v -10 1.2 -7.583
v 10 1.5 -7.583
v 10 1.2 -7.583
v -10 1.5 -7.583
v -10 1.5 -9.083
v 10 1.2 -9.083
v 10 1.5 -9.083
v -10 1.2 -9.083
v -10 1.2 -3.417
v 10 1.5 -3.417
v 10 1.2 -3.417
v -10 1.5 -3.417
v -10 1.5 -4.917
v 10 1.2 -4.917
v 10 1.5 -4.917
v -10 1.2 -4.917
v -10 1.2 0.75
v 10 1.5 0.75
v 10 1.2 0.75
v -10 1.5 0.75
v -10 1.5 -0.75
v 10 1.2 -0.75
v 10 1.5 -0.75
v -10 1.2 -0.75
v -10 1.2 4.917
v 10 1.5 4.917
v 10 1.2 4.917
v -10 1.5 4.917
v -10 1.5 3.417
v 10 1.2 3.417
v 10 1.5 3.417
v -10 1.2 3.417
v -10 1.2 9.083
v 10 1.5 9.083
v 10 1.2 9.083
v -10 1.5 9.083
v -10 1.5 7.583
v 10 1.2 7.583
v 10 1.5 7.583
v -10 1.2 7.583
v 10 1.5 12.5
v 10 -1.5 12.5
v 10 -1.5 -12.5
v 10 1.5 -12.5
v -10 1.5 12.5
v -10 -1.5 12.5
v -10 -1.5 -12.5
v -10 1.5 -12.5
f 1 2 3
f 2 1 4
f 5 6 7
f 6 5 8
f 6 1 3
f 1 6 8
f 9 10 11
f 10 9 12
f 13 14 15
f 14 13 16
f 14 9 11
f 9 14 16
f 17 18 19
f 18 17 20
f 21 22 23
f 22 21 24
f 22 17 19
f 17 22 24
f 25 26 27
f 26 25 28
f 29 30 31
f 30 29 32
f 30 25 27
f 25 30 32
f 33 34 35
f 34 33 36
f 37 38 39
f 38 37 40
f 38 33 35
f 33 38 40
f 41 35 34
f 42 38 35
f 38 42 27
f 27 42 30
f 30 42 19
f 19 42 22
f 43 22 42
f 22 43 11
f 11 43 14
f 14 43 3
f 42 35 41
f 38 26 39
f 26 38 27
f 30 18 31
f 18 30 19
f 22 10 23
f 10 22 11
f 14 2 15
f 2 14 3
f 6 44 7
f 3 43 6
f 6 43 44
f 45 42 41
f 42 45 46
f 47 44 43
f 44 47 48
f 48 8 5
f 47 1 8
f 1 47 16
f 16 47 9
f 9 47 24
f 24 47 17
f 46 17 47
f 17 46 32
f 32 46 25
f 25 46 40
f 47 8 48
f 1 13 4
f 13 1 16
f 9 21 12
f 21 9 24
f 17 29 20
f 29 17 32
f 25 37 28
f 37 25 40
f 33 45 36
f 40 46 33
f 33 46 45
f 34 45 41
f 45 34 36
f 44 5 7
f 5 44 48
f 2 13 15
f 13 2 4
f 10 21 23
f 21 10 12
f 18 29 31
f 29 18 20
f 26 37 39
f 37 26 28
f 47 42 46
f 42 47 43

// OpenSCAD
// Gripper fingertip attachments — TPU 95A with grip ridges
// Port of hardware/cad/gripper_tips.py
// Regenerate: openscad -o hardware/stl/gripper_tips_tpu.stl hardware/scad/gripper_tips.scad

// Parameters (mm)
FINGER_WIDTH  = 20.0;
TIP_THICKNESS = 3.0;
TIP_LENGTH    = 25.0;
RIDGE_COUNT   = 5;
RIDGE_DEPTH   = 0.8;
RIDGE_WIDTH   = 1.5;

// Tip base with grip ridges cut out
difference() {
    cube([FINGER_WIDTH, TIP_THICKNESS, TIP_LENGTH], center = true);

    // Cut ridges along the grip surface
    for (i = [0 : RIDGE_COUNT - 1]) {
        z_pos = -TIP_LENGTH / 2 + TIP_LENGTH / (RIDGE_COUNT + 1) * (i + 1);
        translate([0, TIP_THICKNESS / 2 - RIDGE_DEPTH / 2 + 0.5, z_pos])
            cube([FINGER_WIDTH + 1, RIDGE_DEPTH, RIDGE_WIDTH], center = true);
    }
}
